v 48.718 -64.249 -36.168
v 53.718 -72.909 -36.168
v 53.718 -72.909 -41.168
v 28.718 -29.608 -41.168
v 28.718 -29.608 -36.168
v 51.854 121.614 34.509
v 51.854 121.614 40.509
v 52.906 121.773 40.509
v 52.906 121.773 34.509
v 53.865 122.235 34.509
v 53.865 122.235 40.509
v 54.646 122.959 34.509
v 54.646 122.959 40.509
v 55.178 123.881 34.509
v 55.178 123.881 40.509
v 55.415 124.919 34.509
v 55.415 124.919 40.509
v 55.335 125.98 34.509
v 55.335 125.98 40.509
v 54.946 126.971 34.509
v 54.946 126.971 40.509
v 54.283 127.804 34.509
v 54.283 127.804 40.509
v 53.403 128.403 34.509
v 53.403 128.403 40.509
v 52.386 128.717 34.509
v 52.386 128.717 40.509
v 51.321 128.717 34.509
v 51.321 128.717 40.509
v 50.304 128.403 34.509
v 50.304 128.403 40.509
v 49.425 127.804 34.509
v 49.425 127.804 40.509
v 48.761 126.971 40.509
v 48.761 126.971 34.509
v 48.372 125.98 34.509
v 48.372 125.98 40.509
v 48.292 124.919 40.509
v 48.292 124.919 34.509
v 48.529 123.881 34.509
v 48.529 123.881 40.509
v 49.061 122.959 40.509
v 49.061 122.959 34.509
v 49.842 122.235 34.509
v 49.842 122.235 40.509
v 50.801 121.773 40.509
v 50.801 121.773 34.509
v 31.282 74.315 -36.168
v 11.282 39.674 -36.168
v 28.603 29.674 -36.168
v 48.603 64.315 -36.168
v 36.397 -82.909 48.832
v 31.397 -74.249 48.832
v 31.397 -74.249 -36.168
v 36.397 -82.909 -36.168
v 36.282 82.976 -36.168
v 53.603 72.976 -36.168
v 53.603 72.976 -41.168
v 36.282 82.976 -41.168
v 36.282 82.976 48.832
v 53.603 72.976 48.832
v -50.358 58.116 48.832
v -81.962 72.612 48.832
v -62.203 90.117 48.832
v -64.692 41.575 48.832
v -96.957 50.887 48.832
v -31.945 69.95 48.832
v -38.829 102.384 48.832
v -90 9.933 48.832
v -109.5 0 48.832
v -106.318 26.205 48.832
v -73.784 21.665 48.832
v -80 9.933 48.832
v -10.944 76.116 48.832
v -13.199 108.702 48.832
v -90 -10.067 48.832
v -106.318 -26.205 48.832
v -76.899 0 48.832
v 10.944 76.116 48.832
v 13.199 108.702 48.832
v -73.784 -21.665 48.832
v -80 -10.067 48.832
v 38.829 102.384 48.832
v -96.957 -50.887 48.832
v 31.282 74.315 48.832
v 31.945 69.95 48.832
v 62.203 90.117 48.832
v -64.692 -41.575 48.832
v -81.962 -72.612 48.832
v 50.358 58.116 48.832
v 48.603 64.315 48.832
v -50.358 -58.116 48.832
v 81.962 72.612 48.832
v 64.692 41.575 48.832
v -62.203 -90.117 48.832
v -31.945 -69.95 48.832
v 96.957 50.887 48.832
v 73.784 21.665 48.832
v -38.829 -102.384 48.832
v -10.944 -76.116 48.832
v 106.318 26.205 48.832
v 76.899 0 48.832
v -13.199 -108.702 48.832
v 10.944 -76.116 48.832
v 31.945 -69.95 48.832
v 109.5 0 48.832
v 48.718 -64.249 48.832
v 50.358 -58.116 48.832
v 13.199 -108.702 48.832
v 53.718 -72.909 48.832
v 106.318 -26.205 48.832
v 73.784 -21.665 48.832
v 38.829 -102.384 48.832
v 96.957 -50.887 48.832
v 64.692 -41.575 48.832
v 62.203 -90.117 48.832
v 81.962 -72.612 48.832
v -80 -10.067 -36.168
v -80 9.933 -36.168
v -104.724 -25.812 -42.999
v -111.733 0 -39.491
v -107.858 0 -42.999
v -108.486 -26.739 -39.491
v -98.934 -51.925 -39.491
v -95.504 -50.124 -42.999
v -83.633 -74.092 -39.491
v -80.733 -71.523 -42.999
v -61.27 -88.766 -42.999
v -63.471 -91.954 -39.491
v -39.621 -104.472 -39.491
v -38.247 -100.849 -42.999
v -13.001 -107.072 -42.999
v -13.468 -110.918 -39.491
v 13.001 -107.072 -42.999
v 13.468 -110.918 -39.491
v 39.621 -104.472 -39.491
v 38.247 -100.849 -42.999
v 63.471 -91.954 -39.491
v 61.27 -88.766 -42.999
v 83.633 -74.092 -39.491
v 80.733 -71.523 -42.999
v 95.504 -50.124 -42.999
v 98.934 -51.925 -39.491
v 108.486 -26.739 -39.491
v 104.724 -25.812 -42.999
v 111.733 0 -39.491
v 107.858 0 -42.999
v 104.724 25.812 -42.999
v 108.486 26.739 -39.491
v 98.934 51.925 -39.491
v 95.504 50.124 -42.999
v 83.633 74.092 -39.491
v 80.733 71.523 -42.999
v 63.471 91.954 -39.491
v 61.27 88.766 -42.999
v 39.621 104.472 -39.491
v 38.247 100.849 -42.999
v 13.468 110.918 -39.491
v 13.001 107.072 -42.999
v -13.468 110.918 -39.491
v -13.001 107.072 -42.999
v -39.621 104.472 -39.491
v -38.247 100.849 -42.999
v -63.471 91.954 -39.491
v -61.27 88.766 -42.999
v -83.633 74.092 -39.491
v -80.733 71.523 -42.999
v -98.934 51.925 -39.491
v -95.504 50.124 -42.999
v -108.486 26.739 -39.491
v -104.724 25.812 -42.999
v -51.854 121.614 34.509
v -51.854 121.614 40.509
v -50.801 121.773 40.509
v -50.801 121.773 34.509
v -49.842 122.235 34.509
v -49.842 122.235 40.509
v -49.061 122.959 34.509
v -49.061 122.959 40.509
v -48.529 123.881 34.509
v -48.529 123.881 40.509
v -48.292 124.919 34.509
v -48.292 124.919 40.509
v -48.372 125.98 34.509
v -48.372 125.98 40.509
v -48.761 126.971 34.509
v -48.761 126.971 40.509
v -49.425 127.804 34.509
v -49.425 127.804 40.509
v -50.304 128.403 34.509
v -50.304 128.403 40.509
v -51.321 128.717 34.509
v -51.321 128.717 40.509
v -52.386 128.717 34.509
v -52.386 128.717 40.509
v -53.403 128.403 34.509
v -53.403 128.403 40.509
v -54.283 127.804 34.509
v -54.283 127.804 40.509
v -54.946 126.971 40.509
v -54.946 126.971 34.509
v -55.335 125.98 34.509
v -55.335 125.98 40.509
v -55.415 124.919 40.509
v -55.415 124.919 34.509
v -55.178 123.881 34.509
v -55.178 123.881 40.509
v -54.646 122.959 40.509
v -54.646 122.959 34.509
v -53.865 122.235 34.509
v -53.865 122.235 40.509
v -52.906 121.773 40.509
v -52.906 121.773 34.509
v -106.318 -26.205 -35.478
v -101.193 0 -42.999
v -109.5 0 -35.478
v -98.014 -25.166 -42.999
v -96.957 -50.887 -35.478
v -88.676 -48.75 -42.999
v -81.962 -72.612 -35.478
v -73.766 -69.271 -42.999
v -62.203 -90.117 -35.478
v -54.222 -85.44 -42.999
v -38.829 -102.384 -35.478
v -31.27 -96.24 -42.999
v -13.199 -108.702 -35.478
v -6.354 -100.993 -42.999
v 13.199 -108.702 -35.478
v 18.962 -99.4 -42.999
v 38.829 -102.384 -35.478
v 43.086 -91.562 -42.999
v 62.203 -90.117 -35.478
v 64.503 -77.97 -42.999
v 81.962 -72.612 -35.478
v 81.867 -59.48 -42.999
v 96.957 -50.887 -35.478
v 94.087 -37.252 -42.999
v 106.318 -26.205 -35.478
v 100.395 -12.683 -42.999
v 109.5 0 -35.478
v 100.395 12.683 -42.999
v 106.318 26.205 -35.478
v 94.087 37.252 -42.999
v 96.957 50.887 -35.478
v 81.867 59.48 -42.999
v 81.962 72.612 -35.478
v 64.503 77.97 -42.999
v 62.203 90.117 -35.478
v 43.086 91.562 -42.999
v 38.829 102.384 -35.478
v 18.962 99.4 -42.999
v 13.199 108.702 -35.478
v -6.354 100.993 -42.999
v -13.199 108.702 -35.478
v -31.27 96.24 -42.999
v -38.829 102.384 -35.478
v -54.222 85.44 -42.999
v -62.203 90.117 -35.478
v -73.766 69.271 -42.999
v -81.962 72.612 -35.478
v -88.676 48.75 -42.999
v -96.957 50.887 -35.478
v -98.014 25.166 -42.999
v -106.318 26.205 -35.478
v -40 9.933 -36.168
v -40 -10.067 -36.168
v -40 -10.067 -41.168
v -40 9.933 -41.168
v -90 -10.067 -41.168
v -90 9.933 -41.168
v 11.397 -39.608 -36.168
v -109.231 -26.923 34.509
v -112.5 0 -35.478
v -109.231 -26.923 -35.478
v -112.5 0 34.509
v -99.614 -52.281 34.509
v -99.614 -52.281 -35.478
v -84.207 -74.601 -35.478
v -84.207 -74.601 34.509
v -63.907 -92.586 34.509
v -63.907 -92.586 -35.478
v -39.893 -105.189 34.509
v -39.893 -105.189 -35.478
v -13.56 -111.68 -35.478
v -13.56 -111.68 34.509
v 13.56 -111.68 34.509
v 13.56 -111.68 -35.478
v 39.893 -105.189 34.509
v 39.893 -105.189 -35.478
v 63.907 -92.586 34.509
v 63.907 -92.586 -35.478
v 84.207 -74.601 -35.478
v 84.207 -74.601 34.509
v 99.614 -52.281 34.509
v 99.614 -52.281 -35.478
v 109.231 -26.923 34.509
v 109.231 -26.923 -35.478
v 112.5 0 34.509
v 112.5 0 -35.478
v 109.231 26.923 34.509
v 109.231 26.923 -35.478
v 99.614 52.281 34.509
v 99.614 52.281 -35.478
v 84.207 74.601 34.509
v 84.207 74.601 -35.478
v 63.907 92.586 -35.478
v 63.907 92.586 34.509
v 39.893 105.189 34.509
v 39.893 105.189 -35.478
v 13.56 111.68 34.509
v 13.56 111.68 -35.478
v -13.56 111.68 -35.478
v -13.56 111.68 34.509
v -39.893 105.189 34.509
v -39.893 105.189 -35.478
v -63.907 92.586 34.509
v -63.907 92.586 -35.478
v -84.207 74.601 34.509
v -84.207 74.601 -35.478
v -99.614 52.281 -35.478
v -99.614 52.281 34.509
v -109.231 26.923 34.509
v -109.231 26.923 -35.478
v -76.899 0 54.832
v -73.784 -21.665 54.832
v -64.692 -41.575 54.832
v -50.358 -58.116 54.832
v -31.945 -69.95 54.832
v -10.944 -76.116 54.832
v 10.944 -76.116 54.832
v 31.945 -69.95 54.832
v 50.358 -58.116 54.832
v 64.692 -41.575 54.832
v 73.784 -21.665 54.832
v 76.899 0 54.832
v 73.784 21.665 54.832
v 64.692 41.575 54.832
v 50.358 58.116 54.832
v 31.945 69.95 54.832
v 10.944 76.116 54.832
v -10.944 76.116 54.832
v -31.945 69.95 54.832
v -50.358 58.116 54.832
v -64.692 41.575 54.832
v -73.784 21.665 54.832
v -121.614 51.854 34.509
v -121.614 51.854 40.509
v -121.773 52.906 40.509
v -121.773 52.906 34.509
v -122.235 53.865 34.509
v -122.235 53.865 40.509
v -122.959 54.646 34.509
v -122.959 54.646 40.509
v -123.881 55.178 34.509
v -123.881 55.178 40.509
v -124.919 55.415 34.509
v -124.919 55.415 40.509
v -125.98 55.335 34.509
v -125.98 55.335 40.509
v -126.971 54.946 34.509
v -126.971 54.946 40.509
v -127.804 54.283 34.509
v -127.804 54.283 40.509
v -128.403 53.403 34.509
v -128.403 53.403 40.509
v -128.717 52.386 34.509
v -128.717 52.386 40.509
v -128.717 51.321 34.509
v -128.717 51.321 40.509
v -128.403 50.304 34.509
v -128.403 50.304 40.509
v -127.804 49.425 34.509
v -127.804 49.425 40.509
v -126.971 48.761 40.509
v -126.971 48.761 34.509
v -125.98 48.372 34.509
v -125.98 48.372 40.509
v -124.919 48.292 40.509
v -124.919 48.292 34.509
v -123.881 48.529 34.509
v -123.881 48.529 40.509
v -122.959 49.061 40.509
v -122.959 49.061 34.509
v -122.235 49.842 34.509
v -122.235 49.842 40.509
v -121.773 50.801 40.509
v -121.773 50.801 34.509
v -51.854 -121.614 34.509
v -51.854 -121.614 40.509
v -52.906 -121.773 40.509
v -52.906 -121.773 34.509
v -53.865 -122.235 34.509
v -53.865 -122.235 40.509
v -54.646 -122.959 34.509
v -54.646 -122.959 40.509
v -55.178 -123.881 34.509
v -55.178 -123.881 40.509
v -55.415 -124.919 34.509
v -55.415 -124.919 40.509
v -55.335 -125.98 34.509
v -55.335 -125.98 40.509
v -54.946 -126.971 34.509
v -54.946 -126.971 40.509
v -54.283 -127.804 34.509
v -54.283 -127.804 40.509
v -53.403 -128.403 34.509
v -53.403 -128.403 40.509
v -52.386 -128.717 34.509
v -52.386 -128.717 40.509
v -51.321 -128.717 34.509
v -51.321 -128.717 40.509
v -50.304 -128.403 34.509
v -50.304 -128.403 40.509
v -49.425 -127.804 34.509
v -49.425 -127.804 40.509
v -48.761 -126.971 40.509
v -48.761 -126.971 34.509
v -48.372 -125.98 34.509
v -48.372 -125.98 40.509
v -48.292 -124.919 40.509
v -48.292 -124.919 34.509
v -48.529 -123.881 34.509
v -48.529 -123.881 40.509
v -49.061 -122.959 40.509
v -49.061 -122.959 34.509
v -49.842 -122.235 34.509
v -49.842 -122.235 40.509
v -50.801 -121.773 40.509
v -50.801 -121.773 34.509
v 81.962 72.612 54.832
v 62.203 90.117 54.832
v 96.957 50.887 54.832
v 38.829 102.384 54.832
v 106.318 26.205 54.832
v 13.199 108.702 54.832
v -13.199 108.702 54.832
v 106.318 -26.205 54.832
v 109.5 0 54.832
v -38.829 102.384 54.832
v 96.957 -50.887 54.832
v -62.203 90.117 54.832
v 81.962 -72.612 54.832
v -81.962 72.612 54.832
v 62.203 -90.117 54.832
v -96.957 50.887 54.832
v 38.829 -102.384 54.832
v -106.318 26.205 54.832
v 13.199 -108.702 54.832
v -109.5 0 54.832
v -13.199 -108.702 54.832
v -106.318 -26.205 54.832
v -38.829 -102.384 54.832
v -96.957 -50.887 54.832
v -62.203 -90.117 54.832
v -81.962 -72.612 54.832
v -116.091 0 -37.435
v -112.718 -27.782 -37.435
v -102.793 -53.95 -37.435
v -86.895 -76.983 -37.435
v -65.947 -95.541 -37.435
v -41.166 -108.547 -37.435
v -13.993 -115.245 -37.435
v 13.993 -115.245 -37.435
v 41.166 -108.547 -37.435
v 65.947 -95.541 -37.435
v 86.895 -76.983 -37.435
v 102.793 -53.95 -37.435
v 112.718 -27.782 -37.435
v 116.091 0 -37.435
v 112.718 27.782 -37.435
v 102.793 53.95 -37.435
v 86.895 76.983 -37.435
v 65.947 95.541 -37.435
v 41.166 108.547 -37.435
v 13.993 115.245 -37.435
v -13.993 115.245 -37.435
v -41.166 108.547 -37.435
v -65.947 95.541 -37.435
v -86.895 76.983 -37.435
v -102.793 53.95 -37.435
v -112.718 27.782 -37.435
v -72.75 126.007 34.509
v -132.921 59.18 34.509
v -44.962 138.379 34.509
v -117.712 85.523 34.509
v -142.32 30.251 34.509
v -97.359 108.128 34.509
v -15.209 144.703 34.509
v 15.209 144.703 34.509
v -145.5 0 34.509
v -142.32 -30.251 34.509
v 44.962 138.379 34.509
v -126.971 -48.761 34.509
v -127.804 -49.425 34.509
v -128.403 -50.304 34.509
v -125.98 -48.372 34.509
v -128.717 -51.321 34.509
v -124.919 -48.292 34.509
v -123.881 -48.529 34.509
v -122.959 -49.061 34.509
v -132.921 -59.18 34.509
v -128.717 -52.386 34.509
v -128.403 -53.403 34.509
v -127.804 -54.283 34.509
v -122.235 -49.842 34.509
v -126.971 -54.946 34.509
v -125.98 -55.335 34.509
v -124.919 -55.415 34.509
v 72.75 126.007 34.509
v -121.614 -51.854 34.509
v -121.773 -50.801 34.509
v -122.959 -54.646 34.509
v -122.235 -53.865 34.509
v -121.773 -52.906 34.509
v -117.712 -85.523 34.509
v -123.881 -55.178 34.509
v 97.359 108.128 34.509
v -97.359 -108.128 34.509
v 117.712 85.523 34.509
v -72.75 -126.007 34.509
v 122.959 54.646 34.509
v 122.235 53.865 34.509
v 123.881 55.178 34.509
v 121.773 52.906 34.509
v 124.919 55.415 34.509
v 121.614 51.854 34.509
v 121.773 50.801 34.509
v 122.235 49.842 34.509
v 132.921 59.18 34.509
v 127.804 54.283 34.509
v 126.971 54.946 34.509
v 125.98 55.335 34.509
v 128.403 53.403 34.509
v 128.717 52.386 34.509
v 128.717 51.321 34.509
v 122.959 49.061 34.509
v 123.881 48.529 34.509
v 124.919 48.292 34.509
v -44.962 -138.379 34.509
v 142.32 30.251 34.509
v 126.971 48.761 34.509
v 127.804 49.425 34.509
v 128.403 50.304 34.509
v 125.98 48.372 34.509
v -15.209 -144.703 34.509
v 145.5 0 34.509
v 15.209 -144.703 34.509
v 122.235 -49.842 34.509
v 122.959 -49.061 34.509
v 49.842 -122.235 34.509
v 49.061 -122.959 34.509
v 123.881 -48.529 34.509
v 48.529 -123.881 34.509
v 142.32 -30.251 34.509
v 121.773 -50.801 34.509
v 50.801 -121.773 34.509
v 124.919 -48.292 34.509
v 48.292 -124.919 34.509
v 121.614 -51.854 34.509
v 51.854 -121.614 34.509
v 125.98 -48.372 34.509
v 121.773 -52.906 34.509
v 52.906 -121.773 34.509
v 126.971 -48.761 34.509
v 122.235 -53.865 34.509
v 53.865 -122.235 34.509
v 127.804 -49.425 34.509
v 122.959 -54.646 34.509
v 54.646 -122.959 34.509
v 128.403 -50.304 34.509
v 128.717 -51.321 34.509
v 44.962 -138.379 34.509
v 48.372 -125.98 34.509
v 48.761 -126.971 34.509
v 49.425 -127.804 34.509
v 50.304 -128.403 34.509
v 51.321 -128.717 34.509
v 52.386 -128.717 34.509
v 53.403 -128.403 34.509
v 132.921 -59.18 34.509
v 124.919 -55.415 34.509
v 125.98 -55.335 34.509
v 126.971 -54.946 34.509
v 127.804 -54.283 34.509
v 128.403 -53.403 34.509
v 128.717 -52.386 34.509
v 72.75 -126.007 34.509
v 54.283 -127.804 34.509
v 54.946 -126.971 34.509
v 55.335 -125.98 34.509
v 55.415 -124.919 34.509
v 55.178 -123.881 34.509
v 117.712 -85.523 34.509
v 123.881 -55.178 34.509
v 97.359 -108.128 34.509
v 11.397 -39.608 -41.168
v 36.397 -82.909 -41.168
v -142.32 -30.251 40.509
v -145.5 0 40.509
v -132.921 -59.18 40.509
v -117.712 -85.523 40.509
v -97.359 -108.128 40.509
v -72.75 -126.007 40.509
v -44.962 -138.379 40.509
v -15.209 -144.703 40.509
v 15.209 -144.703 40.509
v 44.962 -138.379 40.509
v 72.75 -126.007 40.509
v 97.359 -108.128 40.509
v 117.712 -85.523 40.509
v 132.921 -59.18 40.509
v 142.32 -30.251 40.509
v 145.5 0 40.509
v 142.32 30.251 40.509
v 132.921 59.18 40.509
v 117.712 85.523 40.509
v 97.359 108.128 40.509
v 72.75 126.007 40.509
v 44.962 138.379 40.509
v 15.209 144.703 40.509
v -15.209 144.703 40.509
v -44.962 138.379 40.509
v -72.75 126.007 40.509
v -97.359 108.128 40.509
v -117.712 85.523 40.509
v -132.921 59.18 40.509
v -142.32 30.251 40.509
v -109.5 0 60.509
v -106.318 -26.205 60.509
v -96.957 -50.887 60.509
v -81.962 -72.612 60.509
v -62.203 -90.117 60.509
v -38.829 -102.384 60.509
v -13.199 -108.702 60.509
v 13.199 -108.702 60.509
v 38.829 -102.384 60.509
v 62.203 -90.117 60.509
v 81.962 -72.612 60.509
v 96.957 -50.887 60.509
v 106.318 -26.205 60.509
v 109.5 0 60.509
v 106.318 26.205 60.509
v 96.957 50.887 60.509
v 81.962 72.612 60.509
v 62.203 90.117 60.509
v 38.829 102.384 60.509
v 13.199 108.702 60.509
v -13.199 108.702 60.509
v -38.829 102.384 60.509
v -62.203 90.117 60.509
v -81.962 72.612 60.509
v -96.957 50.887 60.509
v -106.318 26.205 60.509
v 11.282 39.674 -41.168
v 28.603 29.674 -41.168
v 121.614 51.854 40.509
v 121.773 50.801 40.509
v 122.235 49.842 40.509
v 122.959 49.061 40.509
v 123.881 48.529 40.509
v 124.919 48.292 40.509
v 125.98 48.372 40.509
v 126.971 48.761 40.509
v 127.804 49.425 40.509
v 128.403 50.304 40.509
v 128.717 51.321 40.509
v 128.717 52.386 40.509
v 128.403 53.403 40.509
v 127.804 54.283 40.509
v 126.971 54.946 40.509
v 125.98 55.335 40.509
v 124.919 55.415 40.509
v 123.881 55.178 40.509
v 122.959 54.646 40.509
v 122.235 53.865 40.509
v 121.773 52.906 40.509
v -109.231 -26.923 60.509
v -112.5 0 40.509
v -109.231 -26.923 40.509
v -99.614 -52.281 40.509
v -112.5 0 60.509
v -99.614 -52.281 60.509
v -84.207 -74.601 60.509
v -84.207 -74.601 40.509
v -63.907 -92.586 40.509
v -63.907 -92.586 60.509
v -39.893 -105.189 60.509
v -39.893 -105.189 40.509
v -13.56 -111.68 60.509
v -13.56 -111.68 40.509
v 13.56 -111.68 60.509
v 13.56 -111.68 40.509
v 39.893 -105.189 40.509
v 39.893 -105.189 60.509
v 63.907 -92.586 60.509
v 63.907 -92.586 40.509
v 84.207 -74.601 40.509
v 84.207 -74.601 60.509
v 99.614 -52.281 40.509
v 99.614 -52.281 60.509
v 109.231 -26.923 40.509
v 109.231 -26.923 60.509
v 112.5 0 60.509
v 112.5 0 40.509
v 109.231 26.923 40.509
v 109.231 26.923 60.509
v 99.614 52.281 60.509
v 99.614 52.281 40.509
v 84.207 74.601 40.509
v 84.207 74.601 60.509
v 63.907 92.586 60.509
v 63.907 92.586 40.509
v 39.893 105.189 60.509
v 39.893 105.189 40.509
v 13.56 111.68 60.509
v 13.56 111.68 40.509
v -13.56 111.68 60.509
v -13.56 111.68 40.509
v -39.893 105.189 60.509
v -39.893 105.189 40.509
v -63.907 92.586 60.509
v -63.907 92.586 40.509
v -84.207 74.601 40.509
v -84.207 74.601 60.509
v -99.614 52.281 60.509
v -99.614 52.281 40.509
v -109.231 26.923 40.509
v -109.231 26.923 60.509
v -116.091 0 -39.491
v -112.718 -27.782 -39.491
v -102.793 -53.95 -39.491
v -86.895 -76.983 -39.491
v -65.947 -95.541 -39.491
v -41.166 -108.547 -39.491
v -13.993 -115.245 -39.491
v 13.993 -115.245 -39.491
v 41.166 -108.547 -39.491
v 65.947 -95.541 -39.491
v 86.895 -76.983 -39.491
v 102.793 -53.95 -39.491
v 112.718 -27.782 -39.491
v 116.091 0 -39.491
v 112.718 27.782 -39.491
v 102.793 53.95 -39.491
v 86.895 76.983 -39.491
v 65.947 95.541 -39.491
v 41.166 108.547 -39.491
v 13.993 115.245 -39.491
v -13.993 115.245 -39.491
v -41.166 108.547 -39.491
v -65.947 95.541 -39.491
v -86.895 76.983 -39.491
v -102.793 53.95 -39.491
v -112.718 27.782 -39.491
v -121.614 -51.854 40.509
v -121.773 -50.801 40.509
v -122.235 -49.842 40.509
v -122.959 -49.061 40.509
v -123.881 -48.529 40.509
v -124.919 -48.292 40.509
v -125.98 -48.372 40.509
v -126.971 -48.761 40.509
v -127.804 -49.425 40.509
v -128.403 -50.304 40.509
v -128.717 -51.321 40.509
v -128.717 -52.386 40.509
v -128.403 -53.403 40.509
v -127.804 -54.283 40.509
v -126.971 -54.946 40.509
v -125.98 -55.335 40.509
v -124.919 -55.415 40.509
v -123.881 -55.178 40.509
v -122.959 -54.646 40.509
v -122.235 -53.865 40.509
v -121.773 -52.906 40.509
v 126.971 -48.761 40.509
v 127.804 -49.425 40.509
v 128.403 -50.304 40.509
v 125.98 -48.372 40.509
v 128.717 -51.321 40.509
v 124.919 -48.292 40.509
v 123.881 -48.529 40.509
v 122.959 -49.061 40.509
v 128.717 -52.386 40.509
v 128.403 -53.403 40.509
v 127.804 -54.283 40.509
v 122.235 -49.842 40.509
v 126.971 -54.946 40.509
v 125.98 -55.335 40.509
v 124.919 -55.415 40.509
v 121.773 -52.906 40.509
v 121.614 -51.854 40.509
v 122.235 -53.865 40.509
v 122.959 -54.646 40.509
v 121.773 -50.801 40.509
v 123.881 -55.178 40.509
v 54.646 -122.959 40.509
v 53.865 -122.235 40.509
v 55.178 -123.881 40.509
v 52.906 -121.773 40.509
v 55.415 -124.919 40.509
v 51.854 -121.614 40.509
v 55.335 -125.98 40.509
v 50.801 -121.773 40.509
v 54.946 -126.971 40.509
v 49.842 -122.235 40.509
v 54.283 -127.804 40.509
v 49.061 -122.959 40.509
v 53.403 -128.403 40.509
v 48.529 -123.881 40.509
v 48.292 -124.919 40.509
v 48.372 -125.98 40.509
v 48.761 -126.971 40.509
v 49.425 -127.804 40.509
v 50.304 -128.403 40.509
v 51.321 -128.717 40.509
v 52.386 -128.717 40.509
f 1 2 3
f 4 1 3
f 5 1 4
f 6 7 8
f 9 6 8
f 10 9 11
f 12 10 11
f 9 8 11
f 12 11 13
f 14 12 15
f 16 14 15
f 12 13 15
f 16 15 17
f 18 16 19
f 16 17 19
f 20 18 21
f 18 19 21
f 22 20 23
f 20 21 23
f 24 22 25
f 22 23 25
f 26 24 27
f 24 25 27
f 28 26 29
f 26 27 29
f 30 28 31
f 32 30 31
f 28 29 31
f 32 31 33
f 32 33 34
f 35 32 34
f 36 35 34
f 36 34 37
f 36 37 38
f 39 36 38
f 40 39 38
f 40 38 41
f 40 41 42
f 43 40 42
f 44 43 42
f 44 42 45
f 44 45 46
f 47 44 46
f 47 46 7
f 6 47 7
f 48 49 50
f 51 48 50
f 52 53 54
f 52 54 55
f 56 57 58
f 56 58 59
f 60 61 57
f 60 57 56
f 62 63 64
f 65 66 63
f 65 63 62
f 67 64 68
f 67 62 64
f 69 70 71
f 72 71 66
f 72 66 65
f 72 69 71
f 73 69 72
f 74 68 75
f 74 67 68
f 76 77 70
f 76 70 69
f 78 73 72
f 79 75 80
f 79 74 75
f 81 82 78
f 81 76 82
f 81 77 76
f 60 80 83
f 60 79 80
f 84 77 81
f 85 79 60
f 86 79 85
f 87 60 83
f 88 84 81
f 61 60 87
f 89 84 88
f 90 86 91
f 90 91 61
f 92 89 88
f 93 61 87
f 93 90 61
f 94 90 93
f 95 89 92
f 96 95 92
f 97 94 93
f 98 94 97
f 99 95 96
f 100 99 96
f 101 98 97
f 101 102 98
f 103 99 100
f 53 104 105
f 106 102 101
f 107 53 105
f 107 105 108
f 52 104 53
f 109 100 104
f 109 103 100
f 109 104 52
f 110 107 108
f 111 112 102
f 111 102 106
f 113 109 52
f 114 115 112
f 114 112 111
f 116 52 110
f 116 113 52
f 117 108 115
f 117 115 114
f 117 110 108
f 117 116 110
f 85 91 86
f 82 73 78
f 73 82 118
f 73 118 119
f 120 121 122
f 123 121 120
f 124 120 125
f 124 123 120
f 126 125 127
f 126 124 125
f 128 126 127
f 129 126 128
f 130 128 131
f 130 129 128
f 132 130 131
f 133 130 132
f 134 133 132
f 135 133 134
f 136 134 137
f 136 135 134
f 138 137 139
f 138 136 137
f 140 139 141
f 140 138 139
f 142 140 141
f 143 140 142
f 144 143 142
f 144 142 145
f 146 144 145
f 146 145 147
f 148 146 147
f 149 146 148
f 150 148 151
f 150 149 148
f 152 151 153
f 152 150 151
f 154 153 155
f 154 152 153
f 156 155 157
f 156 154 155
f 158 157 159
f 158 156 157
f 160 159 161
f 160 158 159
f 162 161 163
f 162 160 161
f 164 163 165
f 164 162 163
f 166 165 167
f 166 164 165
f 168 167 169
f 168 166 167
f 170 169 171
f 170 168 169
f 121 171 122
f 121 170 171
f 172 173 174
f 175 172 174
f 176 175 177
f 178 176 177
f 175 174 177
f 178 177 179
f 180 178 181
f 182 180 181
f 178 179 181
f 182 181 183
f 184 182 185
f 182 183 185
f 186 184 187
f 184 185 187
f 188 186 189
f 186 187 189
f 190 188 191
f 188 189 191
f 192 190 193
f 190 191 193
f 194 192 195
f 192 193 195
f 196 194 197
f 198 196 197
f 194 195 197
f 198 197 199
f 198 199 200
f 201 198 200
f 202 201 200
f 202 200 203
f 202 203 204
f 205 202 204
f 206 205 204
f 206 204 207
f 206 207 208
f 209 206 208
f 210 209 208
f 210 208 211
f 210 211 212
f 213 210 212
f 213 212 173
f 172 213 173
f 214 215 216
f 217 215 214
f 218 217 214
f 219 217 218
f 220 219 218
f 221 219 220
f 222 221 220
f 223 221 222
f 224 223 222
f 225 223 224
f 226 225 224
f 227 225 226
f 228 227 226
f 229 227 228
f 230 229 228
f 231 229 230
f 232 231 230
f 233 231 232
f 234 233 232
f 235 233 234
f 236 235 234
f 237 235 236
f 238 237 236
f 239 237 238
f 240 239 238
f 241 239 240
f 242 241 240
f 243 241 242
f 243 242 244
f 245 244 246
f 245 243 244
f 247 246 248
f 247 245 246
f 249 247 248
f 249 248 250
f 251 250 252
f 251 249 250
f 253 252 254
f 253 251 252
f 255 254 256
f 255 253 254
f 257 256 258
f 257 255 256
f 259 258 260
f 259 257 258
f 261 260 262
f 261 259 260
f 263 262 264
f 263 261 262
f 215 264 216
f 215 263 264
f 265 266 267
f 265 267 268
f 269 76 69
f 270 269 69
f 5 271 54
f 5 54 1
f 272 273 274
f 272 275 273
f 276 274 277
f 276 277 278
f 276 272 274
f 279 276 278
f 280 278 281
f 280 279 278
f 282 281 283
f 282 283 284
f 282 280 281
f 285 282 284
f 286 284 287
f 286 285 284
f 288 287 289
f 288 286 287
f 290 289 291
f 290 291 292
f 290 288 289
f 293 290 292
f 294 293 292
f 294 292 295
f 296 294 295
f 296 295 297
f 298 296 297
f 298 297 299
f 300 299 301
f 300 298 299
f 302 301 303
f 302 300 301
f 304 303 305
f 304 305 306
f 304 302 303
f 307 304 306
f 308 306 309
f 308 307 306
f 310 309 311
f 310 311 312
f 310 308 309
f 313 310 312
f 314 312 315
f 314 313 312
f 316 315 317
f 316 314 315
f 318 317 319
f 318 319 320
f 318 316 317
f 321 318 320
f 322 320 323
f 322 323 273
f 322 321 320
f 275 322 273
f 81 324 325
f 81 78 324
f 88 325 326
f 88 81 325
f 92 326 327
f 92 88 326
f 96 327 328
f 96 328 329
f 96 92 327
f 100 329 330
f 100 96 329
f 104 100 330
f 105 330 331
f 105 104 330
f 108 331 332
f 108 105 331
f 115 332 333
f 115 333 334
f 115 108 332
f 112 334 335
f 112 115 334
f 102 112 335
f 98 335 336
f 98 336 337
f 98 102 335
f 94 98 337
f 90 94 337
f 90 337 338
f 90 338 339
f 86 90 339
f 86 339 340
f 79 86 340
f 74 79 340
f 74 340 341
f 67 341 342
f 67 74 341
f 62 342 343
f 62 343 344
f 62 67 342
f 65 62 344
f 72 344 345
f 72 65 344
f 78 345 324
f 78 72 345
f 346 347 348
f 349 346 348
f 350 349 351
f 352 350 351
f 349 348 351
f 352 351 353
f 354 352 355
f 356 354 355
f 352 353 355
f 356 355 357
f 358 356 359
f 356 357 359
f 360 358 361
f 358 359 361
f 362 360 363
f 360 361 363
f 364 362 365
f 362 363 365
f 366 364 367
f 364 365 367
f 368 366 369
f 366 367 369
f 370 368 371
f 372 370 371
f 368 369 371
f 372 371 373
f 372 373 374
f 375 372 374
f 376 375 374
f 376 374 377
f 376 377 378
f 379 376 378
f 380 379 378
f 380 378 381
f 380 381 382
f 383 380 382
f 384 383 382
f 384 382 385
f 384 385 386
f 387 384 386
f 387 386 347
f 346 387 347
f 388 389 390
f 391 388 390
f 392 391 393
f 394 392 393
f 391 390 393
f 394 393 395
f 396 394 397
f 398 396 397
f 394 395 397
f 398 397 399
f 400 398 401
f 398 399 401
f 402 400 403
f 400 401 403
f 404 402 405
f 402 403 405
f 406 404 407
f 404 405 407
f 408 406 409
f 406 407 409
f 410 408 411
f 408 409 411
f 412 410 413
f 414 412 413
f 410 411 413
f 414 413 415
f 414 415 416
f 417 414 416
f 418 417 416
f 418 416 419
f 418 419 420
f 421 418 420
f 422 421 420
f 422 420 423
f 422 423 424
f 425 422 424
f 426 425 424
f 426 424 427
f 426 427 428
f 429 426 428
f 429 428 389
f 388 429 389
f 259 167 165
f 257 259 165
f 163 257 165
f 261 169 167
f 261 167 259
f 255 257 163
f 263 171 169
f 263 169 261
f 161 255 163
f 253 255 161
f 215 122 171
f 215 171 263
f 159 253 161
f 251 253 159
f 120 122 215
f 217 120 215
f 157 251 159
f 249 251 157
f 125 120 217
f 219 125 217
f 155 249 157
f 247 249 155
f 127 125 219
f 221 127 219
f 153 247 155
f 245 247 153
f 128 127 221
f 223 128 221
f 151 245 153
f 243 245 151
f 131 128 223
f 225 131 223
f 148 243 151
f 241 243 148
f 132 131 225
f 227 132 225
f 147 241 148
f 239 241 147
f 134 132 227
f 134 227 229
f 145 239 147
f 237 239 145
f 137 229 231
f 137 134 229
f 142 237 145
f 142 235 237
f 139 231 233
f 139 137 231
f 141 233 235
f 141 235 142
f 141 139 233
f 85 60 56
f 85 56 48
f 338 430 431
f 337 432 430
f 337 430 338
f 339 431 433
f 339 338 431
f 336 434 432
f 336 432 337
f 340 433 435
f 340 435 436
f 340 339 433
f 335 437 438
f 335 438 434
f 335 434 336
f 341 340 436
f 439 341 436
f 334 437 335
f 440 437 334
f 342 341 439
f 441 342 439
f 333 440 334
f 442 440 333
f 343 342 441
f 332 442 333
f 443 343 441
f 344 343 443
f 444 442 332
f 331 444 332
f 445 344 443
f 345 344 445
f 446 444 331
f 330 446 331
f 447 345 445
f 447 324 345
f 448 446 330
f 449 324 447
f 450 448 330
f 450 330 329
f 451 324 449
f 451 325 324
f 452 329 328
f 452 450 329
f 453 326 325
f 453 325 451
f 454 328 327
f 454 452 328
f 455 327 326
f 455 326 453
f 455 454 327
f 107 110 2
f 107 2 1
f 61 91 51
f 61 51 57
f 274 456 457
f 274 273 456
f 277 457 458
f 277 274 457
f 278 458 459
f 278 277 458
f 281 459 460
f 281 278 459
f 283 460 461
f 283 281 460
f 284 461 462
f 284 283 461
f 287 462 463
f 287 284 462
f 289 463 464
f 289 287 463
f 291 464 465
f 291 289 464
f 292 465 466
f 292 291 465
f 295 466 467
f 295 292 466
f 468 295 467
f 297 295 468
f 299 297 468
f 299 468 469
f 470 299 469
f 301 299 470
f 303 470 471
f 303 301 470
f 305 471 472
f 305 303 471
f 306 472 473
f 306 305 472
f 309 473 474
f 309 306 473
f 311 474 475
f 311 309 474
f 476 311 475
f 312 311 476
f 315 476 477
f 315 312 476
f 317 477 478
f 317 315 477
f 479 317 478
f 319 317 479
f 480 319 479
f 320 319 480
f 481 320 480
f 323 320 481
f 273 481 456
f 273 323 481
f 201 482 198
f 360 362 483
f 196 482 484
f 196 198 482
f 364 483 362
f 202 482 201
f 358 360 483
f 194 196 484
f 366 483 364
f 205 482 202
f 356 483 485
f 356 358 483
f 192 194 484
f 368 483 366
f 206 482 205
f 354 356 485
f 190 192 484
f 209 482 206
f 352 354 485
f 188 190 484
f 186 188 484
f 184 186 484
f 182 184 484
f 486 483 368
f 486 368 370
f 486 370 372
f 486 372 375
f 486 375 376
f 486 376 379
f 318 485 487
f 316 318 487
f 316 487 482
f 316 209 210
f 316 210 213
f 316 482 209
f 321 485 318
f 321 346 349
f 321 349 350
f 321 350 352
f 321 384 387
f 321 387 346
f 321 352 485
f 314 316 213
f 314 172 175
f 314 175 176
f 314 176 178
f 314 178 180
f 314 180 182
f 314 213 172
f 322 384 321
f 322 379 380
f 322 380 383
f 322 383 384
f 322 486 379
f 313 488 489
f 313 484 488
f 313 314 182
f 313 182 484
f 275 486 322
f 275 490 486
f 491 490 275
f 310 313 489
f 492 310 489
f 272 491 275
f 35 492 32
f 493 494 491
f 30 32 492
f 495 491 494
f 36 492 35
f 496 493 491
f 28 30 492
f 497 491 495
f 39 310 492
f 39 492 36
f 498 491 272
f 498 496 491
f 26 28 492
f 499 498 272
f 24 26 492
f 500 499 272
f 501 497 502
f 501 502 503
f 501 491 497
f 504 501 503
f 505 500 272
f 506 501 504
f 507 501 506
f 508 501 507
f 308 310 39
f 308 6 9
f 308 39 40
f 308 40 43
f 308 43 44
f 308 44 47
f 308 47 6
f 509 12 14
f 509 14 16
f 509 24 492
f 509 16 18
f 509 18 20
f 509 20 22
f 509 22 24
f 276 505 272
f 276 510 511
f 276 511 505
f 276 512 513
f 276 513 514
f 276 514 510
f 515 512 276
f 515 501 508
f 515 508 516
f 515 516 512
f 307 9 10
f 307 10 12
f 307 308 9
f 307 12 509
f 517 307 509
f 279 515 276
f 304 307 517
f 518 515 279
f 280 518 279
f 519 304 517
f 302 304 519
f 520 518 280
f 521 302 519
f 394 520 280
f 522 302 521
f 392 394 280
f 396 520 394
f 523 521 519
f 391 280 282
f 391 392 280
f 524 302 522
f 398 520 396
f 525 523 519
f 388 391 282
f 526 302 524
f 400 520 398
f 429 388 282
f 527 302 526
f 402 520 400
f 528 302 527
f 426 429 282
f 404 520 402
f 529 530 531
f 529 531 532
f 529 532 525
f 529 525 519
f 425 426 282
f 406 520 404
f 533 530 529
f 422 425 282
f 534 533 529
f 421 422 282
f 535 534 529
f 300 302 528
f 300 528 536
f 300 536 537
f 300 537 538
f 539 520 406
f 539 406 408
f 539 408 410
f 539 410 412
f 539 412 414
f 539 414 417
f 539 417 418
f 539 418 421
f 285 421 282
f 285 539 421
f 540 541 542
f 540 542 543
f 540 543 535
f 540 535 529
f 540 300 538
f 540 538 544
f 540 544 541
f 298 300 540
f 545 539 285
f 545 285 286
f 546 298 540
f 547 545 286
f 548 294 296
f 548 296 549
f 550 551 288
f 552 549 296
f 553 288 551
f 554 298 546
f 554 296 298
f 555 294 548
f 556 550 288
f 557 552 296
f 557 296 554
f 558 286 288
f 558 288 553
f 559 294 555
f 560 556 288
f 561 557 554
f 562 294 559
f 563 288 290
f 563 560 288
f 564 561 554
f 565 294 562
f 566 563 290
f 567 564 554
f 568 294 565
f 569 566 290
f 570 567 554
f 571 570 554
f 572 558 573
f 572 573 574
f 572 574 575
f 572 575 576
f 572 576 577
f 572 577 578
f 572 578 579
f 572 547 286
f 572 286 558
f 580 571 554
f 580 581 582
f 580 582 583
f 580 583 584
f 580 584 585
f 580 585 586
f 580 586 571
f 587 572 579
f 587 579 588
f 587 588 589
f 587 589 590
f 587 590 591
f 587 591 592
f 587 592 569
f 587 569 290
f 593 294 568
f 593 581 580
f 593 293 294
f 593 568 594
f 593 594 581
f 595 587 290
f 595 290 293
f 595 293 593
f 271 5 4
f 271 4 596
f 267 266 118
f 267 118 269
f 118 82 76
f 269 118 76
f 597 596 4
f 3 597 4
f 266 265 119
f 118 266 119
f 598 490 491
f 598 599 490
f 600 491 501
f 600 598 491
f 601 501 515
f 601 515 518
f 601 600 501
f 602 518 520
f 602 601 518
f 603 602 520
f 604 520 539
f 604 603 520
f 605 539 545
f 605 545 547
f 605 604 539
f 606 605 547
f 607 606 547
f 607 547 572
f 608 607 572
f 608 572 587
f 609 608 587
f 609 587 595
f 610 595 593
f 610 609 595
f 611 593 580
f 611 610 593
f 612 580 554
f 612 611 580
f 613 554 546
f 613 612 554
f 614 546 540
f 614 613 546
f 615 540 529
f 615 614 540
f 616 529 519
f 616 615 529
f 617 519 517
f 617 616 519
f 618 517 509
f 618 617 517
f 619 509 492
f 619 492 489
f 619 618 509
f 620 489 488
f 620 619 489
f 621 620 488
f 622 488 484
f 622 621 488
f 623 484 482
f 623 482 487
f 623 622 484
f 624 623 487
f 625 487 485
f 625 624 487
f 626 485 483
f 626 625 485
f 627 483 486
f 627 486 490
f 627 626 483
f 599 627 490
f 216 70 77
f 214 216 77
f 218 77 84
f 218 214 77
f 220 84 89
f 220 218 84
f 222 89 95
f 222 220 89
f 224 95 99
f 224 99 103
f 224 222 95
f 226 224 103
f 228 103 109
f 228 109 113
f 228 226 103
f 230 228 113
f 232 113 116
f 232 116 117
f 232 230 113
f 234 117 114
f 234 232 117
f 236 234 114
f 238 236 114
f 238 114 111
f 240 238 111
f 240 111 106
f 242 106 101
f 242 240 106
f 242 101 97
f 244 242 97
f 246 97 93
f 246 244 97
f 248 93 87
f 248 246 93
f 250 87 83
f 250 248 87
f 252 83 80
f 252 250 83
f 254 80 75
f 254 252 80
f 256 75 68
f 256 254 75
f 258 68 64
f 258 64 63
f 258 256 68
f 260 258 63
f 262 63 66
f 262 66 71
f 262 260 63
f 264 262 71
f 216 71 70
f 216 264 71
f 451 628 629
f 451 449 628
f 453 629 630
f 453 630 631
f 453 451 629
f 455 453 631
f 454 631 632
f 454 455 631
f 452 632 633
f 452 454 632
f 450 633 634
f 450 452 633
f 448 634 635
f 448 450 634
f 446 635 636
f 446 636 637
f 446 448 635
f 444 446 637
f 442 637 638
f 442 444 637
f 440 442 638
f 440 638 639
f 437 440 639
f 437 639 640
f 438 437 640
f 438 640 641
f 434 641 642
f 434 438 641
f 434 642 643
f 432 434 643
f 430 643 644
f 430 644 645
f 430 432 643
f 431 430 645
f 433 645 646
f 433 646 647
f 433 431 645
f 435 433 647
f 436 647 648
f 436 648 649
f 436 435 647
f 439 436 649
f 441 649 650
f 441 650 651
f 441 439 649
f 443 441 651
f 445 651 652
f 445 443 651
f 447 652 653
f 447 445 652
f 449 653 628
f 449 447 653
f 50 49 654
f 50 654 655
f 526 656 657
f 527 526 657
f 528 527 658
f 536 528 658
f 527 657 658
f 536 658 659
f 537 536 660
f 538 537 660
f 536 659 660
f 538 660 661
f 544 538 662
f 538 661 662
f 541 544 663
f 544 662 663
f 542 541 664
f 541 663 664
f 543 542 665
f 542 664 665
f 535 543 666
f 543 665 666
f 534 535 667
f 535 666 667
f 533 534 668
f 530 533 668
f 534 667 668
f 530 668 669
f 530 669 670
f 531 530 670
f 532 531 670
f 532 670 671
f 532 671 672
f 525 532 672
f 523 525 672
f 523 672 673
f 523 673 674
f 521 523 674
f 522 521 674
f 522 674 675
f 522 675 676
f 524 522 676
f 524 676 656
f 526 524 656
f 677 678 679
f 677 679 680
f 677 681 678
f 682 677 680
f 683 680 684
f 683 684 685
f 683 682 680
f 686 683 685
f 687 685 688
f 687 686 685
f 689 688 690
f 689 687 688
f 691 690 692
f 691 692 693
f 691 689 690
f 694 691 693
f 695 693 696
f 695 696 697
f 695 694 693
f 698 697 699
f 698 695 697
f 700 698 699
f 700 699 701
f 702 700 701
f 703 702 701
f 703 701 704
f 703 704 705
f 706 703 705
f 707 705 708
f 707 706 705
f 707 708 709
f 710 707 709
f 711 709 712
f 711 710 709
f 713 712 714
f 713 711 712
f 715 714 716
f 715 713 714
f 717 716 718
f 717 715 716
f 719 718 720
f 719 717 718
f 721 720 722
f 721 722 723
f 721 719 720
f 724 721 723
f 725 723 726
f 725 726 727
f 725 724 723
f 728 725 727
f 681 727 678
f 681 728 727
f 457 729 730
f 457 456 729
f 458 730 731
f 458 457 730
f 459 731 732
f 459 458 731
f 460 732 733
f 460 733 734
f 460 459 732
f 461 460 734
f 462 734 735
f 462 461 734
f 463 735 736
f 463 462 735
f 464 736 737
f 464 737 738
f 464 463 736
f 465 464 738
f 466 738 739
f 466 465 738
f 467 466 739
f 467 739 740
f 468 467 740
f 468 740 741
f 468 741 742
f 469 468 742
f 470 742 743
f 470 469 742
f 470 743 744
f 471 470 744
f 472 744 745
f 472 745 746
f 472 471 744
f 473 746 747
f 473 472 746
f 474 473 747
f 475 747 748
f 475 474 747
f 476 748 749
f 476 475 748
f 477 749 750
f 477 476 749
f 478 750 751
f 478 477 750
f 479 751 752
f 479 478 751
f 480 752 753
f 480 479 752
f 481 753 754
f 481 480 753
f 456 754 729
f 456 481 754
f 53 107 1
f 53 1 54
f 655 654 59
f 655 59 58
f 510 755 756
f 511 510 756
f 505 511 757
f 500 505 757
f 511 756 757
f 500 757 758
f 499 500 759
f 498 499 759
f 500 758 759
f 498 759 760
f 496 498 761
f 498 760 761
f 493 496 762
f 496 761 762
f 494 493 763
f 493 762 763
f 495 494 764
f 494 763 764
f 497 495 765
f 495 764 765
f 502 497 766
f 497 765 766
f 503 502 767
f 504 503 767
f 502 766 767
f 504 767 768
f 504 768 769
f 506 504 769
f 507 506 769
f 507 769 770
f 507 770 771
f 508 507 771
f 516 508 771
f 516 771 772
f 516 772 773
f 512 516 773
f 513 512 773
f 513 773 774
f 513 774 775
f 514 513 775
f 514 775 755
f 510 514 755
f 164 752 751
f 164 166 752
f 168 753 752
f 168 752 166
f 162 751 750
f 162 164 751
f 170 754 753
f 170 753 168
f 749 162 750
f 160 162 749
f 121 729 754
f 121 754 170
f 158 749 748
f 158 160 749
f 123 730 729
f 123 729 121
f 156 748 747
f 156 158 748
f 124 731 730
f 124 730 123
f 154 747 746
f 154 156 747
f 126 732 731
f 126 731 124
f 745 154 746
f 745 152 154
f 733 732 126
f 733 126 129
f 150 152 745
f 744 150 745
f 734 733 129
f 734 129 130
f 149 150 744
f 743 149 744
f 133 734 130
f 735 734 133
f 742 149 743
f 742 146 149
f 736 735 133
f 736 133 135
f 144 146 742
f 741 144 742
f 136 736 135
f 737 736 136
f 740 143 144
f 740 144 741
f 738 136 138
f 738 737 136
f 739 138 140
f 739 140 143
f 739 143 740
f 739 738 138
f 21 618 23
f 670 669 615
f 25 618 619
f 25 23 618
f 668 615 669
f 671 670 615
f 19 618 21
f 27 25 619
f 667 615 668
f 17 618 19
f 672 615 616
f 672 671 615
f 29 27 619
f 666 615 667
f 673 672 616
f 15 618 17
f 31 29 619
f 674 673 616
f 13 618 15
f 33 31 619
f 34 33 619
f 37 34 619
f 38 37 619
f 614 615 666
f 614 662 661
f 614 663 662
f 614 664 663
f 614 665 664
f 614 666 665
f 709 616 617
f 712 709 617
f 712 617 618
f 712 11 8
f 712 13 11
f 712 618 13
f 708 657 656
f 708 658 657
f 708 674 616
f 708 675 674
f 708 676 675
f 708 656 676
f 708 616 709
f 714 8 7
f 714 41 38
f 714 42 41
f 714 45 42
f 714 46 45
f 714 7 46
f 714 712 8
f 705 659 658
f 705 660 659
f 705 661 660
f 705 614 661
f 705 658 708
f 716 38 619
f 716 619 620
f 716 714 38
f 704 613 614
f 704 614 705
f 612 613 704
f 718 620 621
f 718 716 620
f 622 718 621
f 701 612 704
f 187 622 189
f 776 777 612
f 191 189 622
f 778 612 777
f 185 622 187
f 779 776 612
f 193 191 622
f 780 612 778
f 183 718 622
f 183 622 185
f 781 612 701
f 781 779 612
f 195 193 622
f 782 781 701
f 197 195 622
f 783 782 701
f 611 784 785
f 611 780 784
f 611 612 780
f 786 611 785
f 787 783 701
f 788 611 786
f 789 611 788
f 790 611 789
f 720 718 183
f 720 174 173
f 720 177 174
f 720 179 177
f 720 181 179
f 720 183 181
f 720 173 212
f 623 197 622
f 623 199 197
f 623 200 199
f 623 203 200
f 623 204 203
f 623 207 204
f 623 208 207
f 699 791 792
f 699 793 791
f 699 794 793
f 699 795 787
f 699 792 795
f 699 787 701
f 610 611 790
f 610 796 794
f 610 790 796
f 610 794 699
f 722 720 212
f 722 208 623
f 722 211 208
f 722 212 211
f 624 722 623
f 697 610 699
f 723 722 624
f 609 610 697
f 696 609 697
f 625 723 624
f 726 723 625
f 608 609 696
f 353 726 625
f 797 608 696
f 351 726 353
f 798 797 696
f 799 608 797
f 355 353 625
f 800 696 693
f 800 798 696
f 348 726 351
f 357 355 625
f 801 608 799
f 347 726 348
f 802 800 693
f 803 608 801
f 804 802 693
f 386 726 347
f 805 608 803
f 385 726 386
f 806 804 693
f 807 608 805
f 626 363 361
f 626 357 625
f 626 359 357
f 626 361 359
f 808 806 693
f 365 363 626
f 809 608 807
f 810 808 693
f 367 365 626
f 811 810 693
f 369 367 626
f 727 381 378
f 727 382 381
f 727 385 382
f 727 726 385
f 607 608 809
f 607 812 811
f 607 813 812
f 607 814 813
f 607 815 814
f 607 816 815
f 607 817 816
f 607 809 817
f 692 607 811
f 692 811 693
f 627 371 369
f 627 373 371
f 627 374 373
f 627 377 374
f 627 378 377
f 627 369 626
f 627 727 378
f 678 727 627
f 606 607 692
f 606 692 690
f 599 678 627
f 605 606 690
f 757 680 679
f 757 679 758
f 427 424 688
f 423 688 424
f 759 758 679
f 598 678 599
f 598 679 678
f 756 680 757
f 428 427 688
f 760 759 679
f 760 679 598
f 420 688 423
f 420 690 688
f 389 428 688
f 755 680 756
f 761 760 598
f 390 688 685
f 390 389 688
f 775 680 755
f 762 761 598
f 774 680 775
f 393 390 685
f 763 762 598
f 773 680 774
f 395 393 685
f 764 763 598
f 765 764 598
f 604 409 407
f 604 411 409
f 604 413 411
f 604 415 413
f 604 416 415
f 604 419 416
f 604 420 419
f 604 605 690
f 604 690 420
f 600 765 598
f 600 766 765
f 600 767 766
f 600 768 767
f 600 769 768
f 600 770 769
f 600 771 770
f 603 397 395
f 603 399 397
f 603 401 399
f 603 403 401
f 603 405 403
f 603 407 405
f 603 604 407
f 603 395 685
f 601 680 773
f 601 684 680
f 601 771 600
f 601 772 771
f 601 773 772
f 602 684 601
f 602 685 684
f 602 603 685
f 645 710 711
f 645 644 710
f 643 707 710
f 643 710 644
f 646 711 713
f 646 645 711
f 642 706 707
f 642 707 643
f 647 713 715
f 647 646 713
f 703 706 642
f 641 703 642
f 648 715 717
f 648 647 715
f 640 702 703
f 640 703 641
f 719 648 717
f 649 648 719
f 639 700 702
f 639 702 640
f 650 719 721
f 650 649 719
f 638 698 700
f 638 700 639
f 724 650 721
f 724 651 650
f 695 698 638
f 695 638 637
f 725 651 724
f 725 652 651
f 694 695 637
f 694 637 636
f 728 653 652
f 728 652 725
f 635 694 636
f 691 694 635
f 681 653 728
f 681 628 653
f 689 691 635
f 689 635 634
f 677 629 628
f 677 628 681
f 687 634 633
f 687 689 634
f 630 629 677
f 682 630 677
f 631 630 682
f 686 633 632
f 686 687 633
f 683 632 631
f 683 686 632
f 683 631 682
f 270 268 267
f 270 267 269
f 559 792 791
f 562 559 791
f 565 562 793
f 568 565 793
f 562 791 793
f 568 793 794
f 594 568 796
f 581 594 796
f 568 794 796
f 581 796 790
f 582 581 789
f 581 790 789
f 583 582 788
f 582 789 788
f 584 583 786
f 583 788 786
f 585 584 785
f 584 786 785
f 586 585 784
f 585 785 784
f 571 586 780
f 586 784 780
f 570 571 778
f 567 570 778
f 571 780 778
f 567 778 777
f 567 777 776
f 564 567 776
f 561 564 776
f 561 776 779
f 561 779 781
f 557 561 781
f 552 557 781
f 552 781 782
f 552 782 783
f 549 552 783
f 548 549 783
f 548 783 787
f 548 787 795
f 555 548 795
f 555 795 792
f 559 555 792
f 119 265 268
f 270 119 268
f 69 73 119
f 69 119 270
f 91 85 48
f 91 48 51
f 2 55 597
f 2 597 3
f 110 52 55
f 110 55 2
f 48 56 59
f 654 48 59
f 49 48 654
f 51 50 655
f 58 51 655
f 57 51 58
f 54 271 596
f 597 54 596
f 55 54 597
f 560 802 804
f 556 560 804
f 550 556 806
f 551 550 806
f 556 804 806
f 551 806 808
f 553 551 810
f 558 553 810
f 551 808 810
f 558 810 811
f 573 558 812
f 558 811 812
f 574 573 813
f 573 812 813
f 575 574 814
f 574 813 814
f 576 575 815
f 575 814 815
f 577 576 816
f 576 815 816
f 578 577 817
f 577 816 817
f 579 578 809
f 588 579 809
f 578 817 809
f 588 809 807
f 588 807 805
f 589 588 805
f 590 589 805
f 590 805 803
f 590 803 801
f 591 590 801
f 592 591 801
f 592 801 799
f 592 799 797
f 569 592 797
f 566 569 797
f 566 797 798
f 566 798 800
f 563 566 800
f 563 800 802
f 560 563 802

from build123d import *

# Parameters (mm, degrees)
HOLE_WIZARD_1_4_1_D      = 7.14248
PATTERN_CIRCULAR_1_COUNT = 4
SKETCH_6_W               = 10
SKETCH_6_H               = 20
EXTRUDE_1_DEPTH          = 85
SKETCH_7_W               = 50
SKETCH_7_H               = 20
EXTRUDE_2_DEPTH          = 5


with BuildPart() as part:
    # ｽｹｯﾁ1 → 回転1 (revolve)
    with BuildSketch(Plane(origin=(0, 0, 0), x_dir=(1, 0, 0), z_dir=(0, 1, 0))):
        Polygon((111.732704886, 39.491362749), (116.090992439, 39.491362749), (116.090992439, 37.435413944), (112.5, 35.478273614), (112.5, -34.508637251), (145.5, -34.508637251), (145.5, -40.508637251), (112.5, -40.508637251), (112.5, -60.508637251), (109.5, -60.508637251), (109.5, -54.831811372), (76.899138585, -54.831811372), (76.899138585, -48.831811372), (109.5, -48.831811372), (109.5, 35.478273614), (101.192673018, 42.998947767), (107.858230993, 42.998947767), align=None)
    revolve(axis=Axis((0, 0, -66.031649095), (0, 0, 1)))

    # 1/4 すきま穴1 (through all)
    with Locations(Plane(origin=(-125.185676655, 51.853605085, 34.508637251), x_dir=(-1, 0, 0), z_dir=(0, 0, -1))):
        with Locations((0, 0), (0, -103.70721017)):
            hole_wizard_1_4_1 = Hole(HOLE_WIZARD_1_4_1_D / 2)

    # 円形ﾊﾟﾀｰﾝ1: 1/4 すきま穴1 ×4 about axis
    pattern_circular_1_axis = Axis((0, 0, -74.086098759), (0, 0, 1))
    for i in range(1, PATTERN_CIRCULAR_1_COUNT):
        add(hole_wizard_1_4_1.rotate(pattern_circular_1_axis, i * 360 / PATTERN_CIRCULAR_1_COUNT), mode=Mode.SUBTRACT)

    # ｽｹｯﾁ6 → ﾎﾞｽ - 押し出し1 (add)
    with BuildSketch(Plane(origin=(0, 0, 48.831811372), x_dir=(-1, 0, 0), z_dir=(0, 0, -1))):
        Polygon((-31.397465716, -74.248707787), (-36.397465716, -82.908961825), (-53.717973792, -72.908961825), (-48.717973792, -64.248707787), align=None)
        with Locations((85, -0.066649031)):
            Rectangle(SKETCH_6_W, SKETCH_6_H)
        Polygon((-48.602534284, 64.315356818), (-53.602534284, 72.975610856), (-36.282026208, 82.975610856), (-31.282026208, 74.315356818), align=None)
    extrude(amount=EXTRUDE_1_DEPTH)

    # ｽｹｯﾁ7 → ﾎﾞｽ - 押し出し2 (add)
    with BuildSketch(Plane(origin=(0, 0, -36.168188628), x_dir=(-1, 0, 0), z_dir=(0, 0, -1))):
        Polygon((-11.397465716, -39.607691636), (-36.397465716, -82.908961825), (-53.717973792, -72.908961825), (-28.717973792, -29.607691636), align=None)
        with Locations((65, -0.066649031)):
            Rectangle(SKETCH_7_W, SKETCH_7_H)
        Polygon((-28.602534284, 29.674340667), (-53.602534284, 72.975610856), (-36.282026208, 82.975610856), (-11.282026208, 39.674340667), align=None)
    extrude(amount=EXTRUDE_2_DEPTH)


solid = part.part
